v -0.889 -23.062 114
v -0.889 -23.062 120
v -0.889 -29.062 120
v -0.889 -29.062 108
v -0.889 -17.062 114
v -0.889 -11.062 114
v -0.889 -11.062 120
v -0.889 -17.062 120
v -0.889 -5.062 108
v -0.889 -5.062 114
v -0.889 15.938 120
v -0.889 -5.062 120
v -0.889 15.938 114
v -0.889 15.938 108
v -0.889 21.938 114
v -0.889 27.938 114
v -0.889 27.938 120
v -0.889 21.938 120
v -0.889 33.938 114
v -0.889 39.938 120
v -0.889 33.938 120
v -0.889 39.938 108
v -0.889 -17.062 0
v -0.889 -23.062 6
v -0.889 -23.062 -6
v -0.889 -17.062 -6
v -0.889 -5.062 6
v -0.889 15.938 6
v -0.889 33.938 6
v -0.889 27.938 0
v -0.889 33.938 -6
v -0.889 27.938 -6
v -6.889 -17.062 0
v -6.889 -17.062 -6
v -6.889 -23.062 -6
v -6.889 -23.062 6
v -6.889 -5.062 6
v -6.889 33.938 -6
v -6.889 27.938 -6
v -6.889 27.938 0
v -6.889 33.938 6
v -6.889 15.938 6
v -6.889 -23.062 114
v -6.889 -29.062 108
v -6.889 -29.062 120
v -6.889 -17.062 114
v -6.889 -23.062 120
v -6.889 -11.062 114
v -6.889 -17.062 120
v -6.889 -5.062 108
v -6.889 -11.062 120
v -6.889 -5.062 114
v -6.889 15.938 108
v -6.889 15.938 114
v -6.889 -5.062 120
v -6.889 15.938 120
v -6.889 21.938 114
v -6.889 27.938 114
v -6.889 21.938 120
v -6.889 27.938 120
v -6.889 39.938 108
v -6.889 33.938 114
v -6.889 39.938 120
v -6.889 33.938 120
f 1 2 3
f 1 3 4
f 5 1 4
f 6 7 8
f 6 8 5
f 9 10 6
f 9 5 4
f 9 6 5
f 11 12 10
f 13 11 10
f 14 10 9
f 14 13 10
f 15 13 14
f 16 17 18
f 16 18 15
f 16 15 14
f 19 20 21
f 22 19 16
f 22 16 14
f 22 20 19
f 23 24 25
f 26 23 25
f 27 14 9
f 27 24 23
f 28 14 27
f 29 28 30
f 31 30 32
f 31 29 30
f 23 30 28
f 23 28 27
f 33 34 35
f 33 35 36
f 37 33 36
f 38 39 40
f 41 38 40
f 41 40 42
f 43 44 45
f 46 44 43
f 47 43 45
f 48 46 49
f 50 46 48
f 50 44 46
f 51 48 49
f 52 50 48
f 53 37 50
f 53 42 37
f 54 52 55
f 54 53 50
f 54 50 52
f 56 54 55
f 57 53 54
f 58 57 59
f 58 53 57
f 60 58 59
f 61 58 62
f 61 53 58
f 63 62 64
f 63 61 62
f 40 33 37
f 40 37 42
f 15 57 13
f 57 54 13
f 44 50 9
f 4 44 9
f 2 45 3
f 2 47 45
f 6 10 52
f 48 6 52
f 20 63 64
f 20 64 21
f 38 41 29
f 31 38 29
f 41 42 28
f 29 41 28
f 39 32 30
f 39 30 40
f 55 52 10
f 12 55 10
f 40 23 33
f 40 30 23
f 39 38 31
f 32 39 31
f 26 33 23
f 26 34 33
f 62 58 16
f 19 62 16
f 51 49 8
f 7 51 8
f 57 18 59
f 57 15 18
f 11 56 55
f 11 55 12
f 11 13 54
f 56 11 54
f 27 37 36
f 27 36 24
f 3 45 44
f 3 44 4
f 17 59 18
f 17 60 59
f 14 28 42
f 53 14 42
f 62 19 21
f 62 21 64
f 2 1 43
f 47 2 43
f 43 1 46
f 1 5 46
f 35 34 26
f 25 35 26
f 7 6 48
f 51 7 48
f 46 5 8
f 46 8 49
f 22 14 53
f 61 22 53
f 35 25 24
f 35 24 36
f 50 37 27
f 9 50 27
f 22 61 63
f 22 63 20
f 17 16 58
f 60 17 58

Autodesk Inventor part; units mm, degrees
ref_plane "YZ Plane" through (0, 0, 0) normal (1, 0, 0) x (0, 1, 0)
ref_plane "XZ Plane" through (0, 0, 0) normal (0, 1, 0) x (-1, 0, 0)
ref_plane "XY Plane" through (0, 0, 0) normal (0, 0, 1) x (1, 0, 0)
sketch "Sketch1" plane through (0, 0, 0) normal (0, 0, 1) x (1, 0, 0)
  line L0 (316.5108, 23.0377) -> (310.3108, 23.0377) projected
  line L1 (316.5108, 39.9377) -> (316.5108, 23.0377) projected
  line L2 (316.5108, 39.9377) -> (24.9108, 39.9377) projected
  line L3 (24.9108, 39.9377) -> (24.9108, 45.9377) projected
  line L4 (24.9108, 45.9377) -> (316.5108, 45.9377) projected
  line L5 (316.5108, 62.8377) -> (316.5108, 45.9377) projected
  line L6 (301.1069, 62.8377) -> (316.5108, 62.8377) projected
  line L7 (295.9108, 65.8377) -> (301.1069, 62.8377) projected
  line L8 (295.9108, 62.8377) -> (295.9108, 65.8377) projected
  arc A0 (293.9108, 62.8377) -> (295.9108, 62.8377) centre (294.9108, 62.8377) ccw projected
  line L9 (293.9108, 65.8377) -> (293.9108, 62.8377) projected
  line L10 (288.7146, 62.8377) -> (293.9108, 65.8377) projected
  line L11 (272.3069, 62.8377) -> (288.7146, 62.8377) projected
  line L12 (267.1108, 65.8377) -> (272.3069, 62.8377) projected
  line L13 (267.1108, 62.8377) -> (267.1108, 65.8377) projected
  arc A1 (265.1108, 62.8377) -> (267.1108, 62.8377) centre (266.1108, 62.8377) ccw projected
  line L14 (265.1108, 65.8377) -> (265.1108, 62.8377) projected
  line L15 (259.9146, 62.8377) -> (265.1108, 65.8377) projected
  line L16 (243.5069, 62.8377) -> (259.9146, 62.8377) projected
  line L17 (238.3108, 65.8377) -> (243.5069, 62.8377) projected
  line L18 (238.3108, 62.8377) -> (238.3108, 65.8377) projected
  arc A2 (236.3108, 62.8377) -> (238.3108, 62.8377) centre (237.3108, 62.8377) ccw projected
  line L19 (236.3108, 65.8377) -> (236.3108, 62.8377) projected
  line L20 (231.1146, 62.8377) -> (236.3108, 65.8377) projected
  line L21 (214.7069, 62.8377) -> (231.1146, 62.8377) projected
  line L22 (209.5108, 65.8377) -> (214.7069, 62.8377) projected
  line L23 (209.5108, 62.8377) -> (209.5108, 65.8377) projected
  arc A3 (207.5108, 62.8377) -> (209.5108, 62.8377) centre (208.5108, 62.8377) ccw projected
  line L24 (207.5108, 65.8377) -> (207.5108, 62.8377) projected
  line L25 (202.3146, 62.8377) -> (207.5108, 65.8377) projected
  line L26 (185.9069, 62.8377) -> (202.3146, 62.8377) projected
  line L27 (180.7108, 65.8377) -> (185.9069, 62.8377) projected
  line L28 (180.7108, 62.8377) -> (180.7108, 65.8377) projected
  arc A4 (178.7108, 62.8377) -> (180.7108, 62.8377) centre (179.7108, 62.8377) ccw projected
  line L29 (178.7108, 65.8377) -> (178.7108, 62.8377) projected
  line L30 (173.5146, 62.8377) -> (178.7108, 65.8377) projected
  line L31 (157.1069, 62.8377) -> (173.5146, 62.8377) projected
  line L32 (151.9108, 65.8377) -> (157.1069, 62.8377) projected
  line L33 (151.9108, 62.8377) -> (151.9108, 65.8377) projected
  arc A5 (149.9108, 62.8377) -> (151.9108, 62.8377) centre (150.9108, 62.8377) ccw projected
  line L34 (149.9108, 65.8377) -> (149.9108, 62.8377) projected
  line L35 (144.7146, 62.8377) -> (149.9108, 65.8377) projected
  line L36 (128.3069, 62.8377) -> (144.7146, 62.8377) projected
  line L37 (123.1108, 65.8377) -> (128.3069, 62.8377) projected
  line L38 (123.1108, 62.8377) -> (123.1108, 65.8377) projected
  arc A6 (121.1108, 62.8377) -> (123.1108, 62.8377) centre (122.1108, 62.8377) ccw projected
  line L39 (121.1108, 65.8377) -> (121.1108, 62.8377) projected
  line L40 (115.9146, 62.8377) -> (121.1108, 65.8377) projected
  line L41 (99.5069, 62.8377) -> (115.9146, 62.8377) projected
  line L42 (94.3108, 65.8377) -> (99.5069, 62.8377) projected
  line L43 (94.3108, 62.8377) -> (94.3108, 65.8377) projected
  arc A7 (92.3108, 62.8377) -> (94.3108, 62.8377) centre (93.3108, 62.8377) ccw projected
  line L44 (92.3108, 65.8377) -> (92.3108, 62.8377) projected
  line L45 (87.1146, 62.8377) -> (92.3108, 65.8377) projected
  line L46 (70.7069, 62.8377) -> (87.1146, 62.8377) projected
  line L47 (65.5108, 65.8377) -> (70.7069, 62.8377) projected
  line L48 (65.5108, 62.8377) -> (65.5108, 65.8377) projected
  arc A8 (63.5108, 62.8377) -> (65.5108, 62.8377) centre (64.5108, 62.8377) ccw projected
  line L49 (63.5108, 65.8377) -> (63.5108, 62.8377) projected
  line L50 (58.3146, 62.8377) -> (63.5108, 65.8377) projected
  line L51 (41.9069, 62.8377) -> (58.3146, 62.8377) projected
  line L52 (36.7108, 65.8377) -> (41.9069, 62.8377) projected
  line L53 (36.7108, 62.8377) -> (36.7108, 65.8377) projected
  arc A9 (34.7108, 62.8377) -> (36.7108, 62.8377) centre (35.7108, 62.8377) ccw projected
  line L54 (34.7108, 65.8377) -> (34.7108, 62.8377) projected
  line L55 (29.5146, 62.8377) -> (34.7108, 65.8377) projected
  line L56 (13.1069, 62.8377) -> (29.5146, 62.8377) projected
  line L57 (7.9108, 65.8377) -> (13.1069, 62.8377) projected
  line L58 (7.9108, 62.8377) -> (7.9108, 65.8377) projected
  arc A10 (5.9108, 62.8377) -> (7.9108, 62.8377) centre (6.9108, 62.8377) ccw projected
  line L59 (5.9108, 65.8377) -> (5.9108, 62.8377) projected
  line L60 (0.7146, 62.8377) -> (5.9108, 65.8377) projected
  line L61 (-15.6931, 62.8377) -> (0.7146, 62.8377) projected
  line L62 (-20.8892, 65.8377) -> (-15.6931, 62.8377) projected
  line L63 (-20.8892, 62.8377) -> (-20.8892, 65.8377) projected
  arc A11 (-22.8892, 62.8377) -> (-20.8892, 62.8377) centre (-21.8892, 62.8377) ccw projected
  line L64 (-22.8892, 65.8377) -> (-22.8892, 62.8377) projected
  line L65 (-28.0854, 62.8377) -> (-22.8892, 65.8377) projected
  line L66 (-44.4931, 62.8377) -> (-28.0854, 62.8377) projected
  line L67 (-49.6892, 65.8377) -> (-44.4931, 62.8377) projected
  line L68 (-49.6892, 62.8377) -> (-49.6892, 65.8377) projected
  arc A12 (-51.6892, 62.8377) -> (-49.6892, 62.8377) centre (-50.6892, 62.8377) ccw projected
  line L69 (-51.6892, 65.8377) -> (-51.6892, 62.8377) projected
  line L70 (-56.8854, 62.8377) -> (-51.6892, 65.8377) projected
  line L71 (-73.2931, 62.8377) -> (-56.8854, 62.8377) projected
  line L72 (-78.4892, 65.8377) -> (-73.2931, 62.8377) projected
  line L73 (-78.4892, 62.8377) -> (-78.4892, 65.8377) projected
  arc A13 (-80.4892, 62.8377) -> (-78.4892, 62.8377) centre (-79.4892, 62.8377) ccw projected
  line L74 (-80.4892, 65.8377) -> (-80.4892, 62.8377) projected
  line L75 (-85.6854, 62.8377) -> (-80.4892, 65.8377) projected
  line L76 (-102.0931, 62.8377) -> (-85.6854, 62.8377) projected
  line L77 (-107.2892, 65.8377) -> (-102.0931, 62.8377) projected
  line L78 (-107.2892, 62.8377) -> (-107.2892, 65.8377) projected
  arc A14 (-109.2892, 62.8377) -> (-107.2892, 62.8377) centre (-108.2892, 62.8377) ccw projected
  line L79 (-109.2892, 65.8377) -> (-109.2892, 62.8377) projected
  line L80 (-114.4854, 62.8377) -> (-109.2892, 65.8377) projected
  line L81 (-130.8931, 62.8377) -> (-114.4854, 62.8377) projected
  line L82 (-136.0892, 65.8377) -> (-130.8931, 62.8377) projected
  line L83 (-136.0892, 62.8377) -> (-136.0892, 65.8377) projected
  arc A15 (-138.0892, 62.8377) -> (-136.0892, 62.8377) centre (-137.0892, 62.8377) ccw projected
  line L84 (-138.0892, 65.8377) -> (-138.0892, 62.8377) projected
  line L85 (-143.2854, 62.8377) -> (-138.0892, 65.8377) projected
  line L86 (-159.6931, 62.8377) -> (-143.2854, 62.8377) projected
  line L87 (-164.8892, 65.8377) -> (-159.6931, 62.8377) projected
  line L88 (-164.8892, 62.8377) -> (-164.8892, 65.8377) projected
  arc A16 (-166.8892, 62.8377) -> (-164.8892, 62.8377) centre (-165.8892, 62.8377) ccw projected
  line L89 (-166.8892, 65.8377) -> (-166.8892, 62.8377) projected
  line L90 (-172.0854, 62.8377) -> (-166.8892, 65.8377) projected
  line L91 (-188.4931, 62.8377) -> (-172.0854, 62.8377) projected
  line L92 (-193.6892, 65.8377) -> (-188.4931, 62.8377) projected
  line L93 (-193.6892, 62.8377) -> (-193.6892, 65.8377) projected
  arc A17 (-195.6892, 62.8377) -> (-193.6892, 62.8377) centre (-194.6892, 62.8377) ccw projected
  line L94 (-195.6892, 65.8377) -> (-195.6892, 62.8377) projected
  line L95 (-200.8854, 62.8377) -> (-195.6892, 65.8377) projected
  line L96 (-217.2931, 62.8377) -> (-200.8854, 62.8377) projected
  line L97 (-222.4892, 65.8377) -> (-217.2931, 62.8377) projected
  line L98 (-222.4892, 62.8377) -> (-222.4892, 65.8377) projected
  arc A18 (-224.4892, 62.8377) -> (-222.4892, 62.8377) centre (-223.4892, 62.8377) ccw projected
  line L99 (-224.4892, 65.8377) -> (-224.4892, 62.8377) projected
  line L100 (-229.6854, 62.8377) -> (-224.4892, 65.8377) projected
  line L101 (-246.0931, 62.8377) -> (-229.6854, 62.8377) projected
  line L102 (-251.2892, 65.8377) -> (-246.0931, 62.8377) projected
  line L103 (-251.2892, 62.8377) -> (-251.2892, 65.8377) projected
  arc A19 (-253.2892, 62.8377) -> (-251.2892, 62.8377) centre (-252.2892, 62.8377) ccw projected
  line L104 (-253.2892, 65.8377) -> (-253.2892, 62.8377) projected
  line L105 (-258.4854, 62.8377) -> (-253.2892, 65.8377) projected
  line L106 (-258.4854, 62.8377) -> (-266.6892, 62.8377) projected
  line L107 (-266.6892, 23.0377) -> (-266.6892, 62.8377) projected
  line L108 (-244.0854, 23.0377) -> (-266.6892, 23.0377) projected
  line L109 (-238.8892, 20.0377) -> (-244.0854, 23.0377) projected
  line L110 (-238.8892, 23.0377) -> (-238.8892, 20.0377) projected
  arc A20 (-236.8892, 23.0377) -> (-238.8892, 23.0377) centre (-237.8892, 23.0377) ccw projected
  line L111 (-236.8892, 20.0377) -> (-236.8892, 23.0377) projected
  line L112 (-231.6931, 23.0377) -> (-236.8892, 20.0377) projected
  line L113 (-215.2854, 23.0377) -> (-231.6931, 23.0377) projected
  line L114 (-210.0892, 20.0377) -> (-215.2854, 23.0377) projected
  line L115 (-210.0892, 23.0377) -> (-210.0892, 20.0377) projected
  arc A21 (-208.0892, 23.0377) -> (-210.0892, 23.0377) centre (-209.0892, 23.0377) ccw projected
  line L116 (-208.0892, 20.0377) -> (-208.0892, 23.0377) projected
  line L117 (-202.8931, 23.0377) -> (-208.0892, 20.0377) projected
  line L118 (-186.4854, 23.0377) -> (-202.8931, 23.0377) projected
  line L119 (-181.2892, 20.0377) -> (-186.4854, 23.0377) projected
  line L120 (-181.2892, 23.0377) -> (-181.2892, 20.0377) projected
  arc A22 (-179.2892, 23.0377) -> (-181.2892, 23.0377) centre (-180.2892, 23.0377) ccw projected
  line L121 (-179.2892, 20.0377) -> (-179.2892, 23.0377) projected
  line L122 (-174.0931, 23.0377) -> (-179.2892, 20.0377) projected
  line L123 (-157.6854, 23.0377) -> (-174.0931, 23.0377) projected
  line L124 (-152.4892, 20.0377) -> (-157.6854, 23.0377) projected
  line L125 (-152.4892, 23.0377) -> (-152.4892, 20.0377) projected
  arc A23 (-150.4892, 23.0377) -> (-152.4892, 23.0377) centre (-151.4892, 23.0377) ccw projected
  line L126 (-150.4892, 20.0377) -> (-150.4892, 23.0377) projected
  line L127 (-145.2931, 23.0377) -> (-150.4892, 20.0377) projected
  line L128 (-128.8854, 23.0377) -> (-145.2931, 23.0377) projected
  line L129 (-123.6892, 20.0377) -> (-128.8854, 23.0377) projected
  line L130 (-123.6892, 23.0377) -> (-123.6892, 20.0377) projected
  arc A24 (-121.6892, 23.0377) -> (-123.6892, 23.0377) centre (-122.6892, 23.0377) ccw projected
  line L131 (-121.6892, 20.0377) -> (-121.6892, 23.0377) projected
  line L132 (-116.4931, 23.0377) -> (-121.6892, 20.0377) projected
  line L133 (-100.0854, 23.0377) -> (-116.4931, 23.0377) projected
  line L134 (-94.8892, 20.0377) -> (-100.0854, 23.0377) projected
  line L135 (-94.8892, 23.0377) -> (-94.8892, 20.0377) projected
  arc A25 (-92.8892, 23.0377) -> (-94.8892, 23.0377) centre (-93.8892, 23.0377) ccw projected
  line L136 (-92.8892, 20.0377) -> (-92.8892, 23.0377) projected
  line L137 (-87.6931, 23.0377) -> (-92.8892, 20.0377) projected
  line L138 (-71.2854, 23.0377) -> (-87.6931, 23.0377) projected
  line L139 (-66.0892, 20.0377) -> (-71.2854, 23.0377) projected
  line L140 (-66.0892, 23.0377) -> (-66.0892, 20.0377) projected
  arc A26 (-64.0892, 23.0377) -> (-66.0892, 23.0377) centre (-65.0892, 23.0377) ccw projected
  line L141 (-64.0892, 20.0377) -> (-64.0892, 23.0377) projected
  line L142 (-58.8931, 23.0377) -> (-64.0892, 20.0377) projected
  line L143 (-42.4854, 23.0377) -> (-58.8931, 23.0377) projected
  line L144 (-37.2892, 20.0377) -> (-42.4854, 23.0377) projected
  line L145 (-37.2892, 23.0377) -> (-37.2892, 20.0377) projected
  arc A27 (-35.2892, 23.0377) -> (-37.2892, 23.0377) centre (-36.2892, 23.0377) ccw projected
  line L146 (-35.2892, 20.0377) -> (-35.2892, 23.0377) projected
  line L147 (-30.0931, 23.0377) -> (-35.2892, 20.0377) projected
  line L148 (-13.6854, 23.0377) -> (-30.0931, 23.0377) projected
  line L149 (-8.4892, 20.0377) -> (-13.6854, 23.0377) projected
  line L150 (-8.4892, 23.0377) -> (-8.4892, 20.0377) projected
  arc A28 (-6.4892, 23.0377) -> (-8.4892, 23.0377) centre (-7.4892, 23.0377) ccw projected
  line L151 (-6.4892, 20.0377) -> (-6.4892, 23.0377) projected
  line L152 (-1.2931, 23.0377) -> (-6.4892, 20.0377) projected
  line L153 (15.1146, 23.0377) -> (-1.2931, 23.0377) projected
  line L154 (20.3108, 20.0377) -> (15.1146, 23.0377) projected
  line L155 (20.3108, 23.0377) -> (20.3108, 20.0377) projected
  arc A29 (22.3108, 23.0377) -> (20.3108, 23.0377) centre (21.3108, 23.0377) ccw projected
  line L156 (22.3108, 20.0377) -> (22.3108, 23.0377) projected
  line L157 (27.5069, 23.0377) -> (22.3108, 20.0377) projected
  line L158 (43.9146, 23.0377) -> (27.5069, 23.0377) projected
  line L159 (49.1108, 20.0377) -> (43.9146, 23.0377) projected
  line L160 (49.1108, 23.0377) -> (49.1108, 20.0377) projected
  arc A30 (51.1108, 23.0377) -> (49.1108, 23.0377) centre (50.1108, 23.0377) ccw projected
  line L161 (51.1108, 20.0377) -> (51.1108, 23.0377) projected
  line L162 (56.3069, 23.0377) -> (51.1108, 20.0377) projected
  line L163 (72.7146, 23.0377) -> (56.3069, 23.0377) projected
  line L164 (77.9108, 20.0377) -> (72.7146, 23.0377) projected
  line L165 (77.9108, 23.0377) -> (77.9108, 20.0377) projected
  arc A31 (79.9108, 23.0377) -> (77.9108, 23.0377) centre (78.9108, 23.0377) ccw projected
  line L166 (79.9108, 20.0377) -> (79.9108, 23.0377) projected
  line L167 (85.1069, 23.0377) -> (79.9108, 20.0377) projected
  line L168 (101.5146, 23.0377) -> (85.1069, 23.0377) projected
  line L169 (106.7108, 20.0377) -> (101.5146, 23.0377) projected
  line L170 (106.7108, 23.0377) -> (106.7108, 20.0377) projected
  arc A32 (108.7108, 23.0377) -> (106.7108, 23.0377) centre (107.7108, 23.0377) ccw projected
  line L171 (108.7108, 20.0377) -> (108.7108, 23.0377) projected
  line L172 (113.9069, 23.0377) -> (108.7108, 20.0377) projected
  line L173 (130.3146, 23.0377) -> (113.9069, 23.0377) projected
  line L174 (135.5108, 20.0377) -> (130.3146, 23.0377) projected
  line L175 (135.5108, 23.0377) -> (135.5108, 20.0377) projected
  arc A33 (137.5108, 23.0377) -> (135.5108, 23.0377) centre (136.5108, 23.0377) ccw projected
  line L176 (137.5108, 20.0377) -> (137.5108, 23.0377) projected
  line L177 (142.7069, 23.0377) -> (137.5108, 20.0377) projected
  line L178 (159.1146, 23.0377) -> (142.7069, 23.0377) projected
  line L179 (164.3108, 20.0377) -> (159.1146, 23.0377) projected
  line L180 (164.3108, 23.0377) -> (164.3108, 20.0377) projected
  arc A34 (166.3108, 23.0377) -> (164.3108, 23.0377) centre (165.3108, 23.0377) ccw projected
  line L181 (166.3108, 20.0377) -> (166.3108, 23.0377) projected
  line L182 (171.5069, 23.0377) -> (166.3108, 20.0377) projected
  line L183 (187.9146, 23.0377) -> (171.5069, 23.0377) projected
  line L184 (193.1108, 20.0377) -> (187.9146, 23.0377) projected
  line L185 (193.1108, 23.0377) -> (193.1108, 20.0377) projected
  arc A35 (195.1108, 23.0377) -> (193.1108, 23.0377) centre (194.1108, 23.0377) ccw projected
  line L186 (195.1108, 20.0377) -> (195.1108, 23.0377) projected
  line L187 (200.3069, 23.0377) -> (195.1108, 20.0377) projected
  line L188 (216.7146, 23.0377) -> (200.3069, 23.0377) projected
  line L189 (221.9108, 20.0377) -> (216.7146, 23.0377) projected
  line L190 (221.9108, 23.0377) -> (221.9108, 20.0377) projected
  arc A36 (223.9108, 23.0377) -> (221.9108, 23.0377) centre (222.9108, 23.0377) ccw projected
  line L191 (223.9108, 20.0377) -> (223.9108, 23.0377) projected
  line L192 (229.1069, 23.0377) -> (223.9108, 20.0377) projected
  line L193 (245.5146, 23.0377) -> (229.1069, 23.0377) projected
  line L194 (250.7108, 20.0377) -> (245.5146, 23.0377) projected
  line L195 (250.7108, 23.0377) -> (250.7108, 20.0377) projected
  arc A37 (252.7108, 23.0377) -> (250.7108, 23.0377) centre (251.7108, 23.0377) ccw projected
  line L196 (252.7108, 20.0377) -> (252.7108, 23.0377) projected
  line L197 (257.9069, 23.0377) -> (252.7108, 20.0377) projected
  line L198 (274.3146, 23.0377) -> (257.9069, 23.0377) projected
  line L199 (279.5108, 20.0377) -> (274.3146, 23.0377) projected
  line L200 (279.5108, 23.0377) -> (279.5108, 20.0377) projected
  arc A38 (281.5108, 23.0377) -> (279.5108, 23.0377) centre (280.5108, 23.0377) ccw projected
  line L201 (281.5108, 20.0377) -> (281.5108, 23.0377) projected
  line L202 (286.7069, 23.0377) -> (281.5108, 20.0377) projected
  line L203 (303.1146, 23.0377) -> (286.7069, 23.0377) projected
  line L204 (308.3108, 20.0377) -> (303.1146, 23.0377) projected
  line L205 (308.3108, 23.0377) -> (308.3108, 20.0377) projected
  arc A39 (310.3108, 23.0377) -> (308.3108, 23.0377) centre (309.3108, 23.0377) ccw projected
  line L206 (-237.2892, 33.9377) -> (-231.2892, 33.9377) projected
  line L207 (-231.2892, 33.9377) -> (-231.2892, 27.9377) projected
  line L208 (-231.2892, 27.9377) -> (-237.2892, 27.9377) projected
  line L209 (-237.2892, 27.9377) -> (-237.2892, 33.9377) projected
  line L210 (-237.2892, 51.9377) -> (-237.2892, 57.9377) projected
  line L211 (-237.2892, 57.9377) -> (-231.2892, 57.9377) projected
  line L212 (-231.2892, 57.9377) -> (-231.2892, 51.9377) projected
  line L213 (-231.2892, 51.9377) -> (-237.2892, 51.9377) projected
  line L214 (-179.6892, 33.9377) -> (-173.6892, 33.9377) projected
  line L215 (-173.6892, 33.9377) -> (-173.6892, 27.9377) projected
  line L216 (-173.6892, 27.9377) -> (-179.6892, 27.9377) projected
  line L217 (-179.6892, 27.9377) -> (-179.6892, 33.9377) projected
  line L218 (-179.6892, 51.9377) -> (-179.6892, 57.9377) projected
  line L219 (-179.6892, 57.9377) -> (-173.6892, 57.9377) projected
  line L220 (-173.6892, 57.9377) -> (-173.6892, 51.9377) projected
  line L221 (-173.6892, 51.9377) -> (-179.6892, 51.9377) projected
  line L222 (-122.0892, 33.9377) -> (-116.0892, 33.9377) projected
  line L223 (-116.0892, 33.9377) -> (-116.0892, 27.9377) projected
  line L224 (-116.0892, 27.9377) -> (-122.0892, 27.9377) projected
  line L225 (-122.0892, 27.9377) -> (-122.0892, 33.9377) projected
  line L226 (-122.0892, 51.9377) -> (-122.0892, 57.9377) projected
  line L227 (-122.0892, 57.9377) -> (-116.0892, 57.9377) projected
  line L228 (-116.0892, 57.9377) -> (-116.0892, 51.9377) projected
  line L229 (-116.0892, 51.9377) -> (-122.0892, 51.9377) projected
  line L230 (-64.4892, 33.9377) -> (-58.4892, 33.9377) projected
  line L231 (-58.4892, 33.9377) -> (-58.4892, 27.9377) projected
  line L232 (-58.4892, 27.9377) -> (-64.4892, 27.9377) projected
  line L233 (-64.4892, 27.9377) -> (-64.4892, 33.9377) projected
  line L234 (-64.4892, 51.9377) -> (-64.4892, 57.9377) projected
  line L235 (-64.4892, 57.9377) -> (-58.4892, 57.9377) projected
  line L236 (-58.4892, 57.9377) -> (-58.4892, 51.9377) projected
  line L237 (-58.4892, 51.9377) -> (-64.4892, 51.9377) projected
  line L238 (-6.8892, 33.9377) -> (-0.8892, 33.9377) projected
  line L239 (-0.8892, 33.9377) -> (-0.8892, 27.9377) projected
  line L240 (-0.8892, 27.9377) -> (-6.8892, 27.9377) projected
  line L241 (-6.8892, 27.9377) -> (-6.8892, 33.9377) projected
  line L242 (-6.8892, 51.9377) -> (-6.8892, 57.9377) projected
  line L243 (-6.8892, 57.9377) -> (-0.8892, 57.9377) projected
  line L244 (-0.8892, 57.9377) -> (-0.8892, 51.9377) projected
  line L245 (-0.8892, 51.9377) -> (-6.8892, 51.9377) projected
  line L246 (50.7108, 33.9377) -> (56.7108, 33.9377) projected
  line L247 (56.7108, 33.9377) -> (56.7108, 27.9377) projected
  line L248 (56.7108, 27.9377) -> (50.7108, 27.9377) projected
  line L249 (50.7108, 27.9377) -> (50.7108, 33.9377) projected
  line L250 (50.7108, 51.9377) -> (50.7108, 57.9377) projected
  line L251 (50.7108, 57.9377) -> (56.7108, 57.9377) projected
  line L252 (56.7108, 57.9377) -> (56.7108, 51.9377) projected
  line L253 (56.7108, 51.9377) -> (50.7108, 51.9377) projected
  line L254 (108.3108, 33.9377) -> (114.3108, 33.9377) projected
  line L255 (114.3108, 33.9377) -> (114.3108, 27.9377) projected
  line L256 (114.3108, 27.9377) -> (108.3108, 27.9377) projected
  line L257 (108.3108, 27.9377) -> (108.3108, 33.9377) projected
  line L258 (108.3108, 51.9377) -> (108.3108, 57.9377) projected
  line L259 (108.3108, 57.9377) -> (114.3108, 57.9377) projected
  line L260 (114.3108, 57.9377) -> (114.3108, 51.9377) projected
  line L261 (114.3108, 51.9377) -> (108.3108, 51.9377) projected
  line L262 (165.9108, 33.9377) -> (171.9108, 33.9377) projected
  line L263 (171.9108, 33.9377) -> (171.9108, 27.9377) projected
  line L264 (171.9108, 27.9377) -> (165.9108, 27.9377) projected
  line L265 (165.9108, 27.9377) -> (165.9108, 33.9377) projected
  line L266 (165.9108, 51.9377) -> (165.9108, 57.9377) projected
  line L267 (165.9108, 57.9377) -> (171.9108, 57.9377) projected
  line L268 (171.9108, 57.9377) -> (171.9108, 51.9377) projected
  line L269 (171.9108, 51.9377) -> (165.9108, 51.9377) projected
  line L270 (223.5108, 33.9377) -> (229.5108, 33.9377) projected
  line L271 (229.5108, 33.9377) -> (229.5108, 27.9377) projected
  line L272 (229.5108, 27.9377) -> (223.5108, 27.9377) projected
  line L273 (223.5108, 27.9377) -> (223.5108, 33.9377) projected
  line L274 (223.5108, 51.9377) -> (223.5108, 57.9377) projected
  line L275 (223.5108, 57.9377) -> (229.5108, 57.9377) projected
  line L276 (229.5108, 57.9377) -> (229.5108, 51.9377) projected
  line L277 (229.5108, 51.9377) -> (223.5108, 51.9377) projected
  line L278 (281.1108, 33.9377) -> (287.1108, 33.9377) projected
  line L279 (287.1108, 33.9377) -> (287.1108, 27.9377) projected
  line L280 (287.1108, 27.9377) -> (281.1108, 27.9377) projected
  line L281 (281.1108, 27.9377) -> (281.1108, 33.9377) projected
  line L282 (281.1108, 51.9377) -> (281.1108, 57.9377) projected
  line L283 (281.1108, 57.9377) -> (287.1108, 57.9377) projected
  line L284 (287.1108, 57.9377) -> (287.1108, 51.9377) projected
  line L285 (287.1108, 51.9377) -> (281.1108, 51.9377) projected
  line L286 (316.5108, -51.9623) -> (310.3108, -51.9623) projected
  line L287 (316.5108, -35.0623) -> (316.5108, -51.9623) projected
  line L288 (316.5108, -35.0623) -> (24.9108, -35.0623) projected
  line L289 (24.9108, -35.0623) -> (24.9108, -29.0623) projected
  line L290 (24.9108, -29.0623) -> (316.5108, -29.0623) projected
  line L291 (316.5108, -12.1623) -> (316.5108, -29.0623) projected
  line L292 (301.1069, -12.1623) -> (316.5108, -12.1623) projected
  line L293 (295.9108, -9.1623) -> (301.1069, -12.1623) projected
  line L294 (295.9108, -12.1623) -> (295.9108, -9.1623) projected
  arc A40 (293.9108, -12.1623) -> (295.9108, -12.1623) centre (294.9108, -12.1623) ccw projected
  line L295 (293.9108, -9.1623) -> (293.9108, -12.1623) projected
  line L296 (288.7146, -12.1623) -> (293.9108, -9.1623) projected
  line L297 (272.3069, -12.1623) -> (288.7146, -12.1623) projected
  line L298 (267.1108, -9.1623) -> (272.3069, -12.1623) projected
  line L299 (267.1108, -12.1623) -> (267.1108, -9.1623) projected
  arc A41 (265.1108, -12.1623) -> (267.1108, -12.1623) centre (266.1108, -12.1623) ccw projected
  line L300 (265.1108, -9.1623) -> (265.1108, -12.1623) projected
  line L301 (259.9146, -12.1623) -> (265.1108, -9.1623) projected
  line L302 (243.5069, -12.1623) -> (259.9146, -12.1623) projected
  line L303 (238.3108, -9.1623) -> (243.5069, -12.1623) projected
  line L304 (238.3108, -12.1623) -> (238.3108, -9.1623) projected
  arc A42 (236.3108, -12.1623) -> (238.3108, -12.1623) centre (237.3108, -12.1623) ccw projected
  line L305 (236.3108, -9.1623) -> (236.3108, -12.1623) projected
  line L306 (231.1146, -12.1623) -> (236.3108, -9.1623) projected
  line L307 (214.7069, -12.1623) -> (231.1146, -12.1623) projected
  line L308 (209.5108, -9.1623) -> (214.7069, -12.1623) projected
  line L309 (209.5108, -12.1623) -> (209.5108, -9.1623) projected
  arc A43 (207.5108, -12.1623) -> (209.5108, -12.1623) centre (208.5108, -12.1623) ccw projected
  line L310 (207.5108, -9.1623) -> (207.5108, -12.1623) projected
  line L311 (202.3146, -12.1623) -> (207.5108, -9.1623) projected
  line L312 (185.9069, -12.1623) -> (202.3146, -12.1623) projected
  line L313 (180.7108, -9.1623) -> (185.9069, -12.1623) projected
  line L314 (180.7108, -12.1623) -> (180.7108, -9.1623) projected
  arc A44 (178.7108, -12.1623) -> (180.7108, -12.1623) centre (179.7108, -12.1623) ccw projected
  line L315 (178.7108, -9.1623) -> (178.7108, -12.1623) projected
  line L316 (173.5146, -12.1623) -> (178.7108, -9.1623) projected
  line L317 (157.1069, -12.1623) -> (173.5146, -12.1623) projected
  line L318 (151.9108, -9.1623) -> (157.1069, -12.1623) projected
  line L319 (151.9108, -12.1623) -> (151.9108, -9.1623) projected
  arc A45 (149.9108, -12.1623) -> (151.9108, -12.1623) centre (150.9108, -12.1623) ccw projected
  line L320 (149.9108, -9.1623) -> (149.9108, -12.1623) projected
  line L321 (144.7146, -12.1623) -> (149.9108, -9.1623) projected
  line L322 (128.3069, -12.1623) -> (144.7146, -12.1623) projected
  line L323 (123.1108, -9.1623) -> (128.3069, -12.1623) projected
  line L324 (123.1108, -12.1623) -> (123.1108, -9.1623) projected
  arc A46 (121.1108, -12.1623) -> (123.1108, -12.1623) centre (122.1108, -12.1623) ccw projected
  line L325 (121.1108, -9.1623) -> (121.1108, -12.1623) projected
  line L326 (115.9146, -12.1623) -> (121.1108, -9.1623) projected
  line L327 (99.5069, -12.1623) -> (115.9146, -12.1623) projected
  line L328 (94.3108, -9.1623) -> (99.5069, -12.1623) projected
  line L329 (94.3108, -12.1623) -> (94.3108, -9.1623) projected
  arc A47 (92.3108, -12.1623) -> (94.3108, -12.1623) centre (93.3108, -12.1623) ccw projected
  line L330 (92.3108, -9.1623) -> (92.3108, -12.1623) projected
  line L331 (87.1146, -12.1623) -> (92.3108, -9.1623) projected
  line L332 (70.7069, -12.1623) -> (87.1146, -12.1623) projected
  line L333 (65.5108, -9.1623) -> (70.7069, -12.1623) projected
  line L334 (65.5108, -12.1623) -> (65.5108, -9.1623) projected
  arc A48 (63.5108, -12.1623) -> (65.5108, -12.1623) centre (64.5108, -12.1623) ccw projected
  line L335 (63.5108, -9.1623) -> (63.5108, -12.1623) projected
  line L336 (58.3146, -12.1623) -> (63.5108, -9.1623) projected
  line L337 (41.9069, -12.1623) -> (58.3146, -12.1623) projected
  line L338 (36.7108, -9.1623) -> (41.9069, -12.1623) projected
  line L339 (36.7108, -12.1623) -> (36.7108, -9.1623) projected
  arc A49 (34.7108, -12.1623) -> (36.7108, -12.1623) centre (35.7108, -12.1623) ccw projected
  line L340 (34.7108, -9.1623) -> (34.7108, -12.1623) projected
  line L341 (29.5146, -12.1623) -> (34.7108, -9.1623) projected
  line L342 (13.1069, -12.1623) -> (29.5146, -12.1623) projected
  line L343 (7.9108, -9.1623) -> (13.1069, -12.1623) projected
  line L344 (7.9108, -12.1623) -> (7.9108, -9.1623) projected
  arc A50 (5.9108, -12.1623) -> (7.9108, -12.1623) centre (6.9108, -12.1623) ccw projected
  line L345 (5.9108, -9.1623) -> (5.9108, -12.1623) projected
  line L346 (0.7146, -12.1623) -> (5.9108, -9.1623) projected
  line L347 (-15.6931, -12.1623) -> (0.7146, -12.1623) projected
  line L348 (-20.8892, -9.1623) -> (-15.6931, -12.1623) projected
  line L349 (-20.8892, -12.1623) -> (-20.8892, -9.1623) projected
  arc A51 (-22.8892, -12.1623) -> (-20.8892, -12.1623) centre (-21.8892, -12.1623) ccw projected
  line L350 (-22.8892, -9.1623) -> (-22.8892, -12.1623) projected
  line L351 (-28.0854, -12.1623) -> (-22.8892, -9.1623) projected
  line L352 (-44.4931, -12.1623) -> (-28.0854, -12.1623) projected
  line L353 (-49.6892, -9.1623) -> (-44.4931, -12.1623) projected
  line L354 (-49.6892, -12.1623) -> (-49.6892, -9.1623) projected
  arc A52 (-51.6892, -12.1623) -> (-49.6892, -12.1623) centre (-50.6892, -12.1623) ccw projected
  line L355 (-51.6892, -9.1623) -> (-51.6892, -12.1623) projected
  line L356 (-56.8854, -12.1623) -> (-51.6892, -9.1623) projected
  line L357 (-73.2931, -12.1623) -> (-56.8854, -12.1623) projected
  line L358 (-78.4892, -9.1623) -> (-73.2931, -12.1623) projected
  line L359 (-78.4892, -12.1623) -> (-78.4892, -9.1623) projected
  arc A53 (-80.4892, -12.1623) -> (-78.4892, -12.1623) centre (-79.4892, -12.1623) ccw projected
  line L360 (-80.4892, -9.1623) -> (-80.4892, -12.1623) projected
  line L361 (-85.6854, -12.1623) -> (-80.4892, -9.1623) projected
  line L362 (-102.0931, -12.1623) -> (-85.6854, -12.1623) projected
  line L363 (-107.2892, -9.1623) -> (-102.0931, -12.1623) projected
  line L364 (-107.2892, -12.1623) -> (-107.2892, -9.1623) projected
  arc A54 (-109.2892, -12.1623) -> (-107.2892, -12.1623) centre (-108.2892, -12.1623) ccw projected
  line L365 (-109.2892, -9.1623) -> (-109.2892, -12.1623) projected
  line L366 (-114.4854, -12.1623) -> (-109.2892, -9.1623) projected
  line L367 (-130.8931, -12.1623) -> (-114.4854, -12.1623) projected
  line L368 (-136.0892, -9.1623) -> (-130.8931, -12.1623) projected
  line L369 (-136.0892, -12.1623) -> (-136.0892, -9.1623) projected
  arc A55 (-138.0892, -12.1623) -> (-136.0892, -12.1623) centre (-137.0892, -12.1623) ccw projected
  line L370 (-138.0892, -9.1623) -> (-138.0892, -12.1623) projected
  line L371 (-143.2854, -12.1623) -> (-138.0892, -9.1623) projected
  line L372 (-159.6931, -12.1623) -> (-143.2854, -12.1623) projected
  line L373 (-164.8892, -9.1623) -> (-159.6931, -12.1623) projected
  line L374 (-164.8892, -12.1623) -> (-164.8892, -9.1623) projected
  arc A56 (-166.8892, -12.1623) -> (-164.8892, -12.1623) centre (-165.8892, -12.1623) ccw projected
  line L375 (-166.8892, -9.1623) -> (-166.8892, -12.1623) projected
  line L376 (-172.0854, -12.1623) -> (-166.8892, -9.1623) projected
  line L377 (-188.4931, -12.1623) -> (-172.0854, -12.1623) projected
  line L378 (-193.6892, -9.1623) -> (-188.4931, -12.1623) projected
  line L379 (-193.6892, -12.1623) -> (-193.6892, -9.1623) projected
  arc A57 (-195.6892, -12.1623) -> (-193.6892, -12.1623) centre (-194.6892, -12.1623) ccw projected
  line L380 (-195.6892, -9.1623) -> (-195.6892, -12.1623) projected
  line L381 (-200.8854, -12.1623) -> (-195.6892, -9.1623) projected
  line L382 (-217.2931, -12.1623) -> (-200.8854, -12.1623) projected
  line L383 (-222.4892, -9.1623) -> (-217.2931, -12.1623) projected
  line L384 (-222.4892, -12.1623) -> (-222.4892, -9.1623) projected
  arc A58 (-224.4892, -12.1623) -> (-222.4892, -12.1623) centre (-223.4892, -12.1623) ccw projected
  line L385 (-224.4892, -9.1623) -> (-224.4892, -12.1623) projected
  line L386 (-229.6854, -12.1623) -> (-224.4892, -9.1623) projected
  line L387 (-246.0931, -12.1623) -> (-229.6854, -12.1623) projected
  line L388 (-251.2892, -9.1623) -> (-246.0931, -12.1623) projected
  line L389 (-251.2892, -12.1623) -> (-251.2892, -9.1623) projected
  arc A59 (-253.2892, -12.1623) -> (-251.2892, -12.1623) centre (-252.2892, -12.1623) ccw projected
  line L390 (-253.2892, -9.1623) -> (-253.2892, -12.1623) projected
  line L391 (-258.4854, -12.1623) -> (-253.2892, -9.1623) projected
  line L392 (-258.4854, -12.1623) -> (-266.6892, -12.1623) projected
  line L393 (-266.6892, -51.9623) -> (-266.6892, -12.1623) projected
  line L394 (-244.0854, -51.9623) -> (-266.6892, -51.9623) projected
  line L395 (-238.8892, -54.9623) -> (-244.0854, -51.9623) projected
  line L396 (-238.8892, -51.9623) -> (-238.8892, -54.9623) projected
  arc A60 (-236.8892, -51.9623) -> (-238.8892, -51.9623) centre (-237.8892, -51.9623) ccw projected
  line L397 (-236.8892, -54.9623) -> (-236.8892, -51.9623) projected
  line L398 (-231.6931, -51.9623) -> (-236.8892, -54.9623) projected
  line L399 (-215.2854, -51.9623) -> (-231.6931, -51.9623) projected
  line L400 (-210.0892, -54.9623) -> (-215.2854, -51.9623) projected
  line L401 (-210.0892, -51.9623) -> (-210.0892, -54.9623) projected
  arc A61 (-208.0892, -51.9623) -> (-210.0892, -51.9623) centre (-209.0892, -51.9623) ccw projected
  line L402 (-208.0892, -54.9623) -> (-208.0892, -51.9623) projected
  line L403 (-202.8931, -51.9623) -> (-208.0892, -54.9623) projected
  line L404 (-186.4854, -51.9623) -> (-202.8931, -51.9623) projected
  line L405 (-181.2892, -54.9623) -> (-186.4854, -51.9623) projected
  line L406 (-181.2892, -51.9623) -> (-181.2892, -54.9623) projected
  arc A62 (-179.2892, -51.9623) -> (-181.2892, -51.9623) centre (-180.2892, -51.9623) ccw projected
  line L407 (-179.2892, -54.9623) -> (-179.2892, -51.9623) projected
  line L408 (-174.0931, -51.9623) -> (-179.2892, -54.9623) projected
  line L409 (-157.6854, -51.9623) -> (-174.0931, -51.9623) projected
  line L410 (-152.4892, -54.9623) -> (-157.6854, -51.9623) projected
  line L411 (-152.4892, -51.9623) -> (-152.4892, -54.9623) projected
  arc A63 (-150.4892, -51.9623) -> (-152.4892, -51.9623) centre (-151.4892, -51.9623) ccw projected
  line L412 (-150.4892, -54.9623) -> (-150.4892, -51.9623) projected
  line L413 (-145.2931, -51.9623) -> (-150.4892, -54.9623) projected
  line L414 (-128.8854, -51.9623) -> (-145.2931, -51.9623) projected
  line L415 (-123.6892, -54.9623) -> (-128.8854, -51.9623) projected
  line L416 (-123.6892, -51.9623) -> (-123.6892, -54.9623) projected
  arc A64 (-121.6892, -51.9623) -> (-123.6892, -51.9623) centre (-122.6892, -51.9623) ccw projected
  line L417 (-121.6892, -54.9623) -> (-121.6892, -51.9623) projected
  line L418 (-116.4931, -51.9623) -> (-121.6892, -54.9623) projected
  line L419 (-100.0854, -51.9623) -> (-116.4931, -51.9623) projected
  line L420 (-94.8892, -54.9623) -> (-100.0854, -51.9623) projected
  line L421 (-94.8892, -51.9623) -> (-94.8892, -54.9623) projected
  arc A65 (-92.8892, -51.9623) -> (-94.8892, -51.9623) centre (-93.8892, -51.9623) ccw projected
  line L422 (-92.8892, -54.9623) -> (-92.8892, -51.9623) projected
  line L423 (-87.6931, -51.9623) -> (-92.8892, -54.9623) projected
  line L424 (-71.2854, -51.9623) -> (-87.6931, -51.9623) projected
  line L425 (-66.0892, -54.9623) -> (-71.2854, -51.9623) projected
  line L426 (-66.0892, -51.9623) -> (-66.0892, -54.9623) projected
  arc A66 (-64.0892, -51.9623) -> (-66.0892, -51.9623) centre (-65.0892, -51.9623) ccw projected
  line L427 (-64.0892, -54.9623) -> (-64.0892, -51.9623) projected
  line L428 (-58.8931, -51.9623) -> (-64.0892, -54.9623) projected
  line L429 (-42.4854, -51.9623) -> (-58.8931, -51.9623) projected
  line L430 (-37.2892, -54.9623) -> (-42.4854, -51.9623) projected
  line L431 (-37.2892, -51.9623) -> (-37.2892, -54.9623) projected
  arc A67 (-35.2892, -51.9623) -> (-37.2892, -51.9623) centre (-36.2892, -51.9623) ccw projected
  line L432 (-35.2892, -54.9623) -> (-35.2892, -51.9623) projected
  line L433 (-30.0931, -51.9623) -> (-35.2892, -54.9623) projected
  line L434 (-13.6854, -51.9623) -> (-30.0931, -51.9623) projected
  line L435 (-8.4892, -54.9623) -> (-13.6854, -51.9623) projected
  line L436 (-8.4892, -51.9623) -> (-8.4892, -54.9623) projected
  arc A68 (-6.4892, -51.9623) -> (-8.4892, -51.9623) centre (-7.4892, -51.9623) ccw projected
  line L437 (-6.4892, -54.9623) -> (-6.4892, -51.9623) projected
  line L438 (-1.2931, -51.9623) -> (-6.4892, -54.9623) projected
  line L439 (15.1146, -51.9623) -> (-1.2931, -51.9623) projected
  line L440 (20.3108, -54.9623) -> (15.1146, -51.9623) projected
  line L441 (20.3108, -51.9623) -> (20.3108, -54.9623) projected
  arc A69 (22.3108, -51.9623) -> (20.3108, -51.9623) centre (21.3108, -51.9623) ccw projected
  line L442 (22.3108, -54.9623) -> (22.3108, -51.9623) projected
  line L443 (27.5069, -51.9623) -> (22.3108, -54.9623) projected
  line L444 (43.9146, -51.9623) -> (27.5069, -51.9623) projected
  line L445 (49.1108, -54.9623) -> (43.9146, -51.9623) projected
  line L446 (49.1108, -51.9623) -> (49.1108, -54.9623) projected
  arc A70 (51.1108, -51.9623) -> (49.1108, -51.9623) centre (50.1108, -51.9623) ccw projected
  line L447 (51.1108, -54.9623) -> (51.1108, -51.9623) projected
  line L448 (56.3069, -51.9623) -> (51.1108, -54.9623) projected
  line L449 (72.7146, -51.9623) -> (56.3069, -51.9623) projected
  line L450 (77.9108, -54.9623) -> (72.7146, -51.9623) projected
  line L451 (77.9108, -51.9623) -> (77.9108, -54.9623) projected
  arc A71 (79.9108, -51.9623) -> (77.9108, -51.9623) centre (78.9108, -51.9623) ccw projected
  line L452 (79.9108, -54.9623) -> (79.9108, -51.9623) projected
  line L453 (85.1069, -51.9623) -> (79.9108, -54.9623) projected
  line L454 (101.5146, -51.9623) -> (85.1069, -51.9623) projected
  line L455 (106.7108, -54.9623) -> (101.5146, -51.9623) projected
  line L456 (106.7108, -51.9623) -> (106.7108, -54.9623) projected
  arc A72 (108.7108, -51.9623) -> (106.7108, -51.9623) centre (107.7108, -51.9623) ccw projected
  line L457 (108.7108, -54.9623) -> (108.7108, -51.9623) projected
  line L458 (113.9069, -51.9623) -> (108.7108, -54.9623) projected
  line L459 (130.3146, -51.9623) -> (113.9069, -51.9623) projected
  line L460 (135.5108, -54.9623) -> (130.3146, -51.9623) projected
  line L461 (135.5108, -51.9623) -> (135.5108, -54.9623) projected
  arc A73 (137.5108, -51.9623) -> (135.5108, -51.9623) centre (136.5108, -51.9623) ccw projected
  line L462 (137.5108, -54.9623) -> (137.5108, -51.9623) projected
  line L463 (142.7069, -51.9623) -> (137.5108, -54.9623) projected
  line L464 (159.1146, -51.9623) -> (142.7069, -51.9623) projected
  line L465 (164.3108, -54.9623) -> (159.1146, -51.9623) projected
  line L466 (164.3108, -51.9623) -> (164.3108, -54.9623) projected
  arc A74 (166.3108, -51.9623) -> (164.3108, -51.9623) centre (165.3108, -51.9623) ccw projected
  line L467 (166.3108, -54.9623) -> (166.3108, -51.9623) projected
  line L468 (171.5069, -51.9623) -> (166.3108, -54.9623) projected
  line L469 (187.9146, -51.9623) -> (171.5069, -51.9623) projected
  line L470 (193.1108, -54.9623) -> (187.9146, -51.9623) projected
  line L471 (193.1108, -51.9623) -> (193.1108, -54.9623) projected
  arc A75 (195.1108, -51.9623) -> (193.1108, -51.9623) centre (194.1108, -51.9623) ccw projected
  line L472 (195.1108, -54.9623) -> (195.1108, -51.9623) projected
  line L473 (200.3069, -51.9623) -> (195.1108, -54.9623) projected
  line L474 (216.7146, -51.9623) -> (200.3069, -51.9623) projected
  line L475 (221.9108, -54.9623) -> (216.7146, -51.9623) projected
  line L476 (221.9108, -51.9623) -> (221.9108, -54.9623) projected
  arc A76 (223.9108, -51.9623) -> (221.9108, -51.9623) centre (222.9108, -51.9623) ccw projected
  line L477 (223.9108, -54.9623) -> (223.9108, -51.9623) projected
  line L478 (229.1069, -51.9623) -> (223.9108, -54.9623) projected
  line L479 (245.5146, -51.9623) -> (229.1069, -51.9623) projected
  line L480 (250.7108, -54.9623) -> (245.5146, -51.9623) projected
  line L481 (250.7108, -51.9623) -> (250.7108, -54.9623) projected
  arc A77 (252.7108, -51.9623) -> (250.7108, -51.9623) centre (251.7108, -51.9623) ccw projected
  line L482 (252.7108, -54.9623) -> (252.7108, -51.9623) projected
  line L483 (257.9069, -51.9623) -> (252.7108, -54.9623) projected
  line L484 (274.3146, -51.9623) -> (257.9069, -51.9623) projected
  line L485 (279.5108, -54.9623) -> (274.3146, -51.9623) projected
  line L486 (279.5108, -51.9623) -> (279.5108, -54.9623) projected
  arc A78 (281.5108, -51.9623) -> (279.5108, -51.9623) centre (280.5108, -51.9623) ccw projected
  line L487 (281.5108, -54.9623) -> (281.5108, -51.9623) projected
  line L488 (286.7069, -51.9623) -> (281.5108, -54.9623) projected
  line L489 (303.1146, -51.9623) -> (286.7069, -51.9623) projected
  line L490 (308.3108, -54.9623) -> (303.1146, -51.9623) projected
  line L491 (308.3108, -51.9623) -> (308.3108, -54.9623) projected
  arc A79 (310.3108, -51.9623) -> (308.3108, -51.9623) centre (309.3108, -51.9623) ccw projected
  line L492 (-237.2892, -41.0623) -> (-231.2892, -41.0623) projected
  line L493 (-231.2892, -41.0623) -> (-231.2892, -47.0623) projected
  line L494 (-231.2892, -47.0623) -> (-237.2892, -47.0623) projected
  line L495 (-237.2892, -47.0623) -> (-237.2892, -41.0623) projected
  line L496 (-237.2892, -23.0623) -> (-237.2892, -17.0623) projected
  line L497 (-237.2892, -17.0623) -> (-231.2892, -17.0623) projected
  line L498 (-231.2892, -17.0623) -> (-231.2892, -23.0623) projected
  line L499 (-231.2892, -23.0623) -> (-237.2892, -23.0623) projected
  line L500 (-179.6892, -41.0623) -> (-173.6892, -41.0623) projected
  line L501 (-173.6892, -41.0623) -> (-173.6892, -47.0623) projected
  line L502 (-173.6892, -47.0623) -> (-179.6892, -47.0623) projected
  line L503 (-179.6892, -47.0623) -> (-179.6892, -41.0623) projected
  line L504 (-179.6892, -23.0623) -> (-179.6892, -17.0623) projected
  line L505 (-179.6892, -17.0623) -> (-173.6892, -17.0623) projected
  line L506 (-173.6892, -17.0623) -> (-173.6892, -23.0623) projected
  line L507 (-173.6892, -23.0623) -> (-179.6892, -23.0623) projected
  line L508 (-122.0892, -41.0623) -> (-116.0892, -41.0623) projected
  line L509 (-116.0892, -41.0623) -> (-116.0892, -47.0623) projected
  line L510 (-116.0892, -47.0623) -> (-122.0892, -47.0623) projected
  line L511 (-122.0892, -47.0623) -> (-122.0892, -41.0623) projected
  line L512 (-122.0892, -23.0623) -> (-122.0892, -17.0623) projected
  line L513 (-122.0892, -17.0623) -> (-116.0892, -17.0623) projected
  line L514 (-116.0892, -17.0623) -> (-116.0892, -23.0623) projected
  line L515 (-116.0892, -23.0623) -> (-122.0892, -23.0623) projected
  line L516 (-64.4892, -41.0623) -> (-58.4892, -41.0623) projected
  line L517 (-58.4892, -41.0623) -> (-58.4892, -47.0623) projected
  line L518 (-58.4892, -47.0623) -> (-64.4892, -47.0623) projected
  line L519 (-64.4892, -47.0623) -> (-64.4892, -41.0623) projected
  line L520 (-64.4892, -23.0623) -> (-64.4892, -17.0623) projected
  line L521 (-64.4892, -17.0623) -> (-58.4892, -17.0623) projected
  line L522 (-58.4892, -17.0623) -> (-58.4892, -23.0623) projected
  line L523 (-58.4892, -23.0623) -> (-64.4892, -23.0623) projected
  line L524 (-6.8892, -41.0623) -> (-0.8892, -41.0623) projected
  line L525 (-0.8892, -41.0623) -> (-0.8892, -47.0623) projected
  line L526 (-0.8892, -47.0623) -> (-6.8892, -47.0623) projected
  line L527 (-6.8892, -47.0623) -> (-6.8892, -41.0623) projected
  line L528 (-6.8892, -23.0623) -> (-6.8892, -17.0623) projected
  line L529 (-6.8892, -17.0623) -> (-0.8892, -17.0623) projected
  line L530 (-0.8892, -17.0623) -> (-0.8892, -23.0623) projected
  line L531 (-0.8892, -23.0623) -> (-6.8892, -23.0623) projected
  line L532 (50.7108, -41.0623) -> (56.7108, -41.0623) projected
  line L533 (56.7108, -41.0623) -> (56.7108, -47.0623) projected
  line L534 (56.7108, -47.0623) -> (50.7108, -47.0623) projected
  line L535 (50.7108, -47.0623) -> (50.7108, -41.0623) projected
  line L536 (50.7108, -23.0623) -> (50.7108, -17.0623) projected
  line L537 (50.7108, -17.0623) -> (56.7108, -17.0623) projected
  line L538 (56.7108, -17.0623) -> (56.7108, -23.0623) projected
  line L539 (56.7108, -23.0623) -> (50.7108, -23.0623) projected
  line L540 (108.3108, -41.0623) -> (114.3108, -41.0623) projected
  line L541 (114.3108, -41.0623) -> (114.3108, -47.0623) projected
  line L542 (114.3108, -47.0623) -> (108.3108, -47.0623) projected
  line L543 (108.3108, -47.0623) -> (108.3108, -41.0623) projected
  line L544 (108.3108, -23.0623) -> (108.3108, -17.0623) projected
  line L545 (108.3108, -17.0623) -> (114.3108, -17.0623) projected
  line L546 (114.3108, -17.0623) -> (114.3108, -23.0623) projected
  line L547 (114.3108, -23.0623) -> (108.3108, -23.0623) projected
  line L548 (165.9108, -41.0623) -> (171.9108, -41.0623) projected
  line L549 (171.9108, -41.0623) -> (171.9108, -47.0623) projected
  line L550 (171.9108, -47.0623) -> (165.9108, -47.0623) projected
  line L551 (165.9108, -47.0623) -> (165.9108, -41.0623) projected
  line L552 (165.9108, -23.0623) -> (165.9108, -17.0623) projected
  line L553 (165.9108, -17.0623) -> (171.9108, -17.0623) projected
  line L554 (171.9108, -17.0623) -> (171.9108, -23.0623) projected
  line L555 (171.9108, -23.0623) -> (165.9108, -23.0623) projected
  line L556 (223.5108, -41.0623) -> (229.5108, -41.0623) projected
  line L557 (229.5108, -41.0623) -> (229.5108, -47.0623) projected
  line L558 (229.5108, -47.0623) -> (223.5108, -47.0623) projected
  line L559 (223.5108, -47.0623) -> (223.5108, -41.0623) projected
  line L560 (223.5108, -23.0623) -> (223.5108, -17.0623) projected
  line L561 (223.5108, -17.0623) -> (229.5108, -17.0623) projected
  line L562 (229.5108, -17.0623) -> (229.5108, -23.0623) projected
  line L563 (229.5108, -23.0623) -> (223.5108, -23.0623) projected
  line L564 (281.1108, -41.0623) -> (287.1108, -41.0623) projected
  line L565 (287.1108, -41.0623) -> (287.1108, -47.0623) projected
  line L566 (287.1108, -47.0623) -> (281.1108, -47.0623) projected
  line L567 (281.1108, -47.0623) -> (281.1108, -41.0623) projected
  line L568 (281.1108, -23.0623) -> (281.1108, -17.0623) projected
  line L569 (281.1108, -17.0623) -> (287.1108, -17.0623) projected
  line L570 (287.1108, -17.0623) -> (287.1108, -23.0623) projected
  line L571 (287.1108, -23.0623) -> (281.1108, -23.0623) projected
  point P0 (0, 0)
extrude "Extrusion1" add sketch "Sketch1" along normal mid plane 12 contours L238 L239 L240 L241 | L528 L529 L530 L531
sketch "Sketch2" plane through (-6.8892, 27.9377, 6) normal (0, -1, 0) x (1, 0, 0)
  line L0 (0, 0) -> (6, 0) projected
  line L1 (0, 0) -> (6, 0)
  line L2 (6, 0) -> (6, -6)
  line L3 (6, -6) -> (0, -6)
  line L4 (0, -6) -> (0, 0)
  point P0 (6.8892, -6)
  dimension "d2" = 6
  dimension "d3" = 6
extrude "Extrusion2" add sketch "Sketch2" along normal up to next
sketch "Sketch4" plane through (0, 0, 6) normal (0, 0, 1) x (1, 0, 0)
  line L0 (-6.8892, 27.9377) -> (-6.8892, -17.0623) projected
  line L1 (-0.8892, 27.9377) -> (-0.8892, -17.0623) projected
  line L2 (-6.8892, -5.0623) -> (-0.8892, -5.0623)
  line L3 (-0.8892, -5.0623) -> (-0.8892, 15.9377)
  line L4 (-0.8892, 15.9377) -> (-6.8892, 15.9377)
  line L5 (-6.8892, 15.9377) -> (-6.8892, -5.0623)
  line L6 (-6.8892, -23.0623) -> (-0.8892, -23.0623) projected
  line L7 (-0.8892, 33.9377) -> (-6.8892, 33.9377) projected
  point P0 (0, 0)
  point P1 (-3.8892, -5.0623)
  dimension "d8" = 18
  dimension "d9" = 18
extrude "Extrusion3" add sketch "Sketch4" along normal blind 114
sketch "Sketch5" plane through (-6.8892, 15.9377, 6) normal (0, 1, 0) x (1, 0, 0)
  line L0 (0, 0) -> (0, -114) projected
  line L1 (6, 0) -> (6, -114) projected
  line L2 (0, -108) -> (6, -108)
  line L3 (6, -108) -> (6, -102)
  line L4 (6, -102) -> (0, -102)
  line L5 (0, -102) -> (0, -108)
  line L6 (6, -114) -> (0, -114) projected
  point P0 (6.8892, 6)
  point P1 (0, -102)
  dimension "d12" = 6
  dimension "d13" = 6
sketch "Sketch6" plane through (-6.8892, -5.0623, 6) normal (0, -1, 0) x (1, 0, 0)
  line L0 (6, 0) -> (6, 114) projected
  line L1 (0, 0) -> (0, 114) projected
  line L2 (6, 108) -> (0, 108)
  line L3 (0, 108) -> (0, 102)
  line L4 (0, 102) -> (6, 102)
  line L5 (6, 102) -> (6, 108)
  line L6 (0, 114) -> (6, 114) projected
  point P0 (6.8892, -6)
  point P1 (0, 108)
  dimension "d14" = 6
  dimension "d15" = 6
extrude "Extrusion4" add sketch "Sketch6" along normal blind 24 contours L4 L1 L2 L0
extrude "Extrusion5" add sketch "Sketch5" along normal blind 24 contours L4 L1 L2 L0
sketch "Sketch7" plane through (-6.8892, 15.9377, 114) normal (0, 0, 1) x (1, 0, 0)
  line L0 (0, -21) -> (0, -39) projected
  line L1 (6, -39) -> (6, -21) projected
  line L2 (0, -21) -> (6, -21)
  line L3 (6, -21) -> (6, -27)
  line L4 (6, -27) -> (0, -27)
  line L5 (0, -27) -> (0, -21)
  line L6 (0, -27) -> (6, -27)
  line L7 (6, -27) -> (6, -33)
  line L8 (6, -33) -> (0, -33)
  line L9 (0, -33) -> (0, -27)
  line L10 (0, -33) -> (6, -33)
  line L11 (6, -33) -> (6, -39)
  line L12 (6, -39) -> (0, -39)
  line L13 (0, -39) -> (0, -33)
  line L14 (0, -39) -> (6, -39)
  line L15 (6, -39) -> (6, -45)
  line L16 (6, -45) -> (0, -45)
  line L17 (0, -45) -> (0, -39)
  line L18 (0, 18) -> (0, 0) projected
  line L19 (0, 0) -> (6, 0)
  line L20 (6, 0) -> (6, 6)
  line L21 (6, 6) -> (0, 6)
  line L22 (0, 6) -> (0, 0)
  line L23 (6, 12) -> (0, 12) projected
  line L24 (0, 6) -> (6, 6)
  line L25 (6, 6) -> (6, 12)
  line L26 (6, 12) -> (0, 12)
  line L27 (0, 12) -> (0, 6)
  line L28 (0, 12) -> (6, 12)
  line L29 (6, 12) -> (6, 18)
  line L30 (6, 18) -> (0, 18)
  line L31 (0, 18) -> (0, 12)
  line L32 (0, 18) -> (6, 18)
  line L33 (6, 18) -> (6, 24)
  line L34 (6, 24) -> (0, 24)
  line L35 (0, 24) -> (0, 18)
  point P0 (6.8892, -15.9377)
  point P1 (6, 6)
  point P2 (0, 6)
  dimension "d20" = 6
  dimension "d21" = 6
  dimension "d22" = 6
  dimension "d23" = 6
  dimension "d24" = 6
  dimension "d25" = 6
  dimension "d26" = 6
  dimension "d27" = 6
  dimension "d28" = 6
  dimension "d29" = 6
  dimension "d30" = 6
  dimension "d31" = 6
  dimension "d32" = 6
  dimension "d33" = 6
  dimension "d34" = 6
extrude "Extrusion6" add sketch "Sketch7" along normal blind 6 contours L4 L1 L8 L0 | L12 L15 L16 L17 | L35 L34 L33 L30 | L23 L25 L21 L18
equation "\"d9\" = d8"
properties part number "FootConnector"
